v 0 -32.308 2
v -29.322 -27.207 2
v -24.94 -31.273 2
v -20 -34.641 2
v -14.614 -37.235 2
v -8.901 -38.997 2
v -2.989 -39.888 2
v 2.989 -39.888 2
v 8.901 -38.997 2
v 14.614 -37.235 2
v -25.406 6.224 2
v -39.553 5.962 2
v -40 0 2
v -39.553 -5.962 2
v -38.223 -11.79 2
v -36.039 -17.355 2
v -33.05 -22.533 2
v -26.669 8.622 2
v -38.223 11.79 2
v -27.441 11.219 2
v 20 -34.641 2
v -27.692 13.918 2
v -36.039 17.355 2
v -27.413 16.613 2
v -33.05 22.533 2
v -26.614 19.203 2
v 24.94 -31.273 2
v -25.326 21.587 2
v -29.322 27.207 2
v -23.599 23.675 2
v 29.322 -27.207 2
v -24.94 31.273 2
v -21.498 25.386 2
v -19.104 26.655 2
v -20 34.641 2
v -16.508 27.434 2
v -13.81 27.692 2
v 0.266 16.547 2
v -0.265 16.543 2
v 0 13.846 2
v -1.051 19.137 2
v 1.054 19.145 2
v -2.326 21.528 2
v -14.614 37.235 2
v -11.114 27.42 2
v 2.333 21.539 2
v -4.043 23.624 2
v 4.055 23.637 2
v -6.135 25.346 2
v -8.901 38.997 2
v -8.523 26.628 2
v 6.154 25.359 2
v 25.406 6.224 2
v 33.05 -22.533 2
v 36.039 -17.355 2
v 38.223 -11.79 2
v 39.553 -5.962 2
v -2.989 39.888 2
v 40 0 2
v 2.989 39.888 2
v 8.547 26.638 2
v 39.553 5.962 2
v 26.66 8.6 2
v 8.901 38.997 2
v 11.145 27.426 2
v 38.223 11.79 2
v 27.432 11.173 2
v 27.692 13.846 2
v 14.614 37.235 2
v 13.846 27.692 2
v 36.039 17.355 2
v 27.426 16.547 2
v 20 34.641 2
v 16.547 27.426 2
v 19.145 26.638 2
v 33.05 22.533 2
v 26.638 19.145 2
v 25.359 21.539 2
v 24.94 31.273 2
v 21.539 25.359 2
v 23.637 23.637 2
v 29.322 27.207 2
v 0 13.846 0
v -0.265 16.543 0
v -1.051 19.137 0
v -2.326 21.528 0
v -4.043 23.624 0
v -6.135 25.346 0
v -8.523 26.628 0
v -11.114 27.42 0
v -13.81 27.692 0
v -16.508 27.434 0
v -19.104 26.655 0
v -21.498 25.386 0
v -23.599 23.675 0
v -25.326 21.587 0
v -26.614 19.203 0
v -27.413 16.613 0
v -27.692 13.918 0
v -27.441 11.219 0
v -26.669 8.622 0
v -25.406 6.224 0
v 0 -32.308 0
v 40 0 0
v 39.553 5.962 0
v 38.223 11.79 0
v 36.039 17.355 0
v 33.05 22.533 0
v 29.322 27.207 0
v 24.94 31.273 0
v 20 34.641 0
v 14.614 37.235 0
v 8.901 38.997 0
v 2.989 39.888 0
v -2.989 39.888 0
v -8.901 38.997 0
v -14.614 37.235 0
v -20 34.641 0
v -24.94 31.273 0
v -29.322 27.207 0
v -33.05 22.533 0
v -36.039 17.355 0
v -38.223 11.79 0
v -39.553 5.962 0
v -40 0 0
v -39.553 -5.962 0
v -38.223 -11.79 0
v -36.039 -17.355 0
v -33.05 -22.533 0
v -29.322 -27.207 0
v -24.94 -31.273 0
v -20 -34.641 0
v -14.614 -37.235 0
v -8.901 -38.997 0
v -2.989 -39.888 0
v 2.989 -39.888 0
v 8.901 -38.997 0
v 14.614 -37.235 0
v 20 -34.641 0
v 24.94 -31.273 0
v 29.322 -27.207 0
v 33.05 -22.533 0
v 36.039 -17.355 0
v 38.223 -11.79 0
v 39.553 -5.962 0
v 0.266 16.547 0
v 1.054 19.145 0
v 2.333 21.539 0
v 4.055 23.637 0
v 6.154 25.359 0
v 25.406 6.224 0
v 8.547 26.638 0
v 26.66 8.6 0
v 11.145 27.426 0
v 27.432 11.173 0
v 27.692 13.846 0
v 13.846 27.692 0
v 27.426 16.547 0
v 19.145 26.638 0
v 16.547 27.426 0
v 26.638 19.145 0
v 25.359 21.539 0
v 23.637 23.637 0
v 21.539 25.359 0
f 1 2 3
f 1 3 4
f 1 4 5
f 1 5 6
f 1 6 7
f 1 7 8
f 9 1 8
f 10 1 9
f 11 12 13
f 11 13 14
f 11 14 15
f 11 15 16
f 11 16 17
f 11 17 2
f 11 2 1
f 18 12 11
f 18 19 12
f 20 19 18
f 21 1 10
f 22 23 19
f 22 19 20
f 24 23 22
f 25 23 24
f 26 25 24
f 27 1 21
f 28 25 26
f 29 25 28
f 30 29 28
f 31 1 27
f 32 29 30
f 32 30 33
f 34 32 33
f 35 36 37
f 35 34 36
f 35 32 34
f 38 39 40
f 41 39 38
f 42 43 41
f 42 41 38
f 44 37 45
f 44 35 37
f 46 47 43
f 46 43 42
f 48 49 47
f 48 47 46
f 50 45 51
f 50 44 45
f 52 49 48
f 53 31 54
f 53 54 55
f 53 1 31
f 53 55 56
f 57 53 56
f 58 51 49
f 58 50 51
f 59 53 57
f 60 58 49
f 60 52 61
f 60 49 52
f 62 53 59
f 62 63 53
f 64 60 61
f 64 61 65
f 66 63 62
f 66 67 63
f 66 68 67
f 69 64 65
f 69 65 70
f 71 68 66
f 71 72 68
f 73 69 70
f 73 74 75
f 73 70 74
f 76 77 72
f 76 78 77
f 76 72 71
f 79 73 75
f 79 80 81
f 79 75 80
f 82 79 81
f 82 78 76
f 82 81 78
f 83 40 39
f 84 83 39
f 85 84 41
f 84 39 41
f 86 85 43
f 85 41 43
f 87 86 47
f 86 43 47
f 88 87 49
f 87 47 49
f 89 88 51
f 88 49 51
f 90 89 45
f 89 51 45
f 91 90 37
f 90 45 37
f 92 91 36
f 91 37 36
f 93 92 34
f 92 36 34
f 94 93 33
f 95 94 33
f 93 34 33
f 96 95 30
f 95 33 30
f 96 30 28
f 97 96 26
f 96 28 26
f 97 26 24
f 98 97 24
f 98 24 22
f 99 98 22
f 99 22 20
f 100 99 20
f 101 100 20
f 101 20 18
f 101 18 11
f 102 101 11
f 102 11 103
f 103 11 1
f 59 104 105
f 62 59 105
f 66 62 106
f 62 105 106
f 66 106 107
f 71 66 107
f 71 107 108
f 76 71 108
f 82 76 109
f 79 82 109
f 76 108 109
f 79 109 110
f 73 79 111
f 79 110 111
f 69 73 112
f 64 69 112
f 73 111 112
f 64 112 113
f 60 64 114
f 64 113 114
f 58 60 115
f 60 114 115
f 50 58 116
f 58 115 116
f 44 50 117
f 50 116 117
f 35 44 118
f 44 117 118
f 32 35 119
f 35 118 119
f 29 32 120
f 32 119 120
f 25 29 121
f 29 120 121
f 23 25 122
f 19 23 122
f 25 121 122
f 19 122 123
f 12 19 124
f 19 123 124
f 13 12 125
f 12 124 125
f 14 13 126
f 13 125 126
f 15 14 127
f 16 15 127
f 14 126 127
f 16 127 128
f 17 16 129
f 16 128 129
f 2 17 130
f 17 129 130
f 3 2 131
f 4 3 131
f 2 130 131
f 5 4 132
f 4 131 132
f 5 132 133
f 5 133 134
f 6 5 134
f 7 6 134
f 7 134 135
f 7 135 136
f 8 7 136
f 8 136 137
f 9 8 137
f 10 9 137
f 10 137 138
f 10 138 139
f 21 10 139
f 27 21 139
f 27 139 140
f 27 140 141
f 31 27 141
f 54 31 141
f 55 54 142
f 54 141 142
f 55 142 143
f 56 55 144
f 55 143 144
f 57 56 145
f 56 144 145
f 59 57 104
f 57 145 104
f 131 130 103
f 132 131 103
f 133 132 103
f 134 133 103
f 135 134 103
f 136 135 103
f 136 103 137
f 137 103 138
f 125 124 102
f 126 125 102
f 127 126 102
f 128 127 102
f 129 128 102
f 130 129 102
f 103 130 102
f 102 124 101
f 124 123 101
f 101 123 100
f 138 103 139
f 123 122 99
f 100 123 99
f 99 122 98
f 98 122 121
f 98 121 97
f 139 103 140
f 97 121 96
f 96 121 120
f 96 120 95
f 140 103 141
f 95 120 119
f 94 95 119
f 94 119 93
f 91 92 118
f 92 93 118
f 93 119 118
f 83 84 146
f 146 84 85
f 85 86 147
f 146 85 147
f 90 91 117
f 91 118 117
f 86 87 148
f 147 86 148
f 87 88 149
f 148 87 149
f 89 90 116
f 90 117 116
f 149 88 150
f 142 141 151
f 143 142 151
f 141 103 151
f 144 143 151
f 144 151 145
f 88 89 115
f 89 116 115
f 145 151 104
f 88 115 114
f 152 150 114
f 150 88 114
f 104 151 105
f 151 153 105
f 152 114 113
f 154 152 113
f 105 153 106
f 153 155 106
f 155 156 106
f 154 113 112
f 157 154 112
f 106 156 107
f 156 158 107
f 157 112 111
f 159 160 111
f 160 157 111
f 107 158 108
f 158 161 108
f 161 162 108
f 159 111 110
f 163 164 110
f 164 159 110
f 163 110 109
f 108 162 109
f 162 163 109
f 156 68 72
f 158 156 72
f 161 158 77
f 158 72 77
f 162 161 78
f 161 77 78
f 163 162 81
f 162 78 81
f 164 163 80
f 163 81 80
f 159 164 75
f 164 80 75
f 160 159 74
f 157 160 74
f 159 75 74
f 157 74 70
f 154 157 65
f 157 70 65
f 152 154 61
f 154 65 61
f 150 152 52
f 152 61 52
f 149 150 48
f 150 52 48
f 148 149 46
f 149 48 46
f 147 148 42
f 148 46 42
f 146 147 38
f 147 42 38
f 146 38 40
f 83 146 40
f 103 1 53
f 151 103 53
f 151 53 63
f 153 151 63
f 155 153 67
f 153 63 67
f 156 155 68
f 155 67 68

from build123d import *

# Parameters (mm, degrees)
F0_R     = 40
F1_DEPTH = 2
F3_DEPTH = 25


with BuildPart() as f1:
    # F0 (on Top) → F1 (new body)
    with BuildSketch(Plane.XY):
        Circle(F0_R)
    extrude(amount=F1_DEPTH)

    # F2 (on face) → F3 (cut)
    with BuildSketch(Plane.XY.offset(2)):
        with BuildLine():
            ThreePointArc((-25.405787, 6.224418), (-9.867491, 0.583944), (0, 13.846154))
            ThreePointArc((0, 13.846154), (-17.824817, 27.108364), (-25.405787, 6.224418))
        make_face()
        with BuildLine():
            ThreePointArc((25.405787, 6.224418), (9.867491, 0.583944), (0, 13.846154))
            ThreePointArc((0, 13.846154), (-9.867491, 0.583944), (-25.405787, 6.224418))
            Line((-25.405787, 6.224418), (0, -32.307692))
            Line((0, -32.307692), (25.405787, 6.224418))
        make_face()
        with BuildLine():
            ThreePointArc((27.692308, 13.846154), (13.846154, 27.692308), (0, 13.846154))
            ThreePointArc((0, 13.846154), (9.867491, 0.583944), (25.405787, 6.224418))
            ThreePointArc((25.405787, 6.224418), (27.108364, 9.867491), (27.692308, 13.846154))
        make_face()
    extrude(amount=-F3_DEPTH, mode=Mode.SUBTRACT)


solid = f1.part
